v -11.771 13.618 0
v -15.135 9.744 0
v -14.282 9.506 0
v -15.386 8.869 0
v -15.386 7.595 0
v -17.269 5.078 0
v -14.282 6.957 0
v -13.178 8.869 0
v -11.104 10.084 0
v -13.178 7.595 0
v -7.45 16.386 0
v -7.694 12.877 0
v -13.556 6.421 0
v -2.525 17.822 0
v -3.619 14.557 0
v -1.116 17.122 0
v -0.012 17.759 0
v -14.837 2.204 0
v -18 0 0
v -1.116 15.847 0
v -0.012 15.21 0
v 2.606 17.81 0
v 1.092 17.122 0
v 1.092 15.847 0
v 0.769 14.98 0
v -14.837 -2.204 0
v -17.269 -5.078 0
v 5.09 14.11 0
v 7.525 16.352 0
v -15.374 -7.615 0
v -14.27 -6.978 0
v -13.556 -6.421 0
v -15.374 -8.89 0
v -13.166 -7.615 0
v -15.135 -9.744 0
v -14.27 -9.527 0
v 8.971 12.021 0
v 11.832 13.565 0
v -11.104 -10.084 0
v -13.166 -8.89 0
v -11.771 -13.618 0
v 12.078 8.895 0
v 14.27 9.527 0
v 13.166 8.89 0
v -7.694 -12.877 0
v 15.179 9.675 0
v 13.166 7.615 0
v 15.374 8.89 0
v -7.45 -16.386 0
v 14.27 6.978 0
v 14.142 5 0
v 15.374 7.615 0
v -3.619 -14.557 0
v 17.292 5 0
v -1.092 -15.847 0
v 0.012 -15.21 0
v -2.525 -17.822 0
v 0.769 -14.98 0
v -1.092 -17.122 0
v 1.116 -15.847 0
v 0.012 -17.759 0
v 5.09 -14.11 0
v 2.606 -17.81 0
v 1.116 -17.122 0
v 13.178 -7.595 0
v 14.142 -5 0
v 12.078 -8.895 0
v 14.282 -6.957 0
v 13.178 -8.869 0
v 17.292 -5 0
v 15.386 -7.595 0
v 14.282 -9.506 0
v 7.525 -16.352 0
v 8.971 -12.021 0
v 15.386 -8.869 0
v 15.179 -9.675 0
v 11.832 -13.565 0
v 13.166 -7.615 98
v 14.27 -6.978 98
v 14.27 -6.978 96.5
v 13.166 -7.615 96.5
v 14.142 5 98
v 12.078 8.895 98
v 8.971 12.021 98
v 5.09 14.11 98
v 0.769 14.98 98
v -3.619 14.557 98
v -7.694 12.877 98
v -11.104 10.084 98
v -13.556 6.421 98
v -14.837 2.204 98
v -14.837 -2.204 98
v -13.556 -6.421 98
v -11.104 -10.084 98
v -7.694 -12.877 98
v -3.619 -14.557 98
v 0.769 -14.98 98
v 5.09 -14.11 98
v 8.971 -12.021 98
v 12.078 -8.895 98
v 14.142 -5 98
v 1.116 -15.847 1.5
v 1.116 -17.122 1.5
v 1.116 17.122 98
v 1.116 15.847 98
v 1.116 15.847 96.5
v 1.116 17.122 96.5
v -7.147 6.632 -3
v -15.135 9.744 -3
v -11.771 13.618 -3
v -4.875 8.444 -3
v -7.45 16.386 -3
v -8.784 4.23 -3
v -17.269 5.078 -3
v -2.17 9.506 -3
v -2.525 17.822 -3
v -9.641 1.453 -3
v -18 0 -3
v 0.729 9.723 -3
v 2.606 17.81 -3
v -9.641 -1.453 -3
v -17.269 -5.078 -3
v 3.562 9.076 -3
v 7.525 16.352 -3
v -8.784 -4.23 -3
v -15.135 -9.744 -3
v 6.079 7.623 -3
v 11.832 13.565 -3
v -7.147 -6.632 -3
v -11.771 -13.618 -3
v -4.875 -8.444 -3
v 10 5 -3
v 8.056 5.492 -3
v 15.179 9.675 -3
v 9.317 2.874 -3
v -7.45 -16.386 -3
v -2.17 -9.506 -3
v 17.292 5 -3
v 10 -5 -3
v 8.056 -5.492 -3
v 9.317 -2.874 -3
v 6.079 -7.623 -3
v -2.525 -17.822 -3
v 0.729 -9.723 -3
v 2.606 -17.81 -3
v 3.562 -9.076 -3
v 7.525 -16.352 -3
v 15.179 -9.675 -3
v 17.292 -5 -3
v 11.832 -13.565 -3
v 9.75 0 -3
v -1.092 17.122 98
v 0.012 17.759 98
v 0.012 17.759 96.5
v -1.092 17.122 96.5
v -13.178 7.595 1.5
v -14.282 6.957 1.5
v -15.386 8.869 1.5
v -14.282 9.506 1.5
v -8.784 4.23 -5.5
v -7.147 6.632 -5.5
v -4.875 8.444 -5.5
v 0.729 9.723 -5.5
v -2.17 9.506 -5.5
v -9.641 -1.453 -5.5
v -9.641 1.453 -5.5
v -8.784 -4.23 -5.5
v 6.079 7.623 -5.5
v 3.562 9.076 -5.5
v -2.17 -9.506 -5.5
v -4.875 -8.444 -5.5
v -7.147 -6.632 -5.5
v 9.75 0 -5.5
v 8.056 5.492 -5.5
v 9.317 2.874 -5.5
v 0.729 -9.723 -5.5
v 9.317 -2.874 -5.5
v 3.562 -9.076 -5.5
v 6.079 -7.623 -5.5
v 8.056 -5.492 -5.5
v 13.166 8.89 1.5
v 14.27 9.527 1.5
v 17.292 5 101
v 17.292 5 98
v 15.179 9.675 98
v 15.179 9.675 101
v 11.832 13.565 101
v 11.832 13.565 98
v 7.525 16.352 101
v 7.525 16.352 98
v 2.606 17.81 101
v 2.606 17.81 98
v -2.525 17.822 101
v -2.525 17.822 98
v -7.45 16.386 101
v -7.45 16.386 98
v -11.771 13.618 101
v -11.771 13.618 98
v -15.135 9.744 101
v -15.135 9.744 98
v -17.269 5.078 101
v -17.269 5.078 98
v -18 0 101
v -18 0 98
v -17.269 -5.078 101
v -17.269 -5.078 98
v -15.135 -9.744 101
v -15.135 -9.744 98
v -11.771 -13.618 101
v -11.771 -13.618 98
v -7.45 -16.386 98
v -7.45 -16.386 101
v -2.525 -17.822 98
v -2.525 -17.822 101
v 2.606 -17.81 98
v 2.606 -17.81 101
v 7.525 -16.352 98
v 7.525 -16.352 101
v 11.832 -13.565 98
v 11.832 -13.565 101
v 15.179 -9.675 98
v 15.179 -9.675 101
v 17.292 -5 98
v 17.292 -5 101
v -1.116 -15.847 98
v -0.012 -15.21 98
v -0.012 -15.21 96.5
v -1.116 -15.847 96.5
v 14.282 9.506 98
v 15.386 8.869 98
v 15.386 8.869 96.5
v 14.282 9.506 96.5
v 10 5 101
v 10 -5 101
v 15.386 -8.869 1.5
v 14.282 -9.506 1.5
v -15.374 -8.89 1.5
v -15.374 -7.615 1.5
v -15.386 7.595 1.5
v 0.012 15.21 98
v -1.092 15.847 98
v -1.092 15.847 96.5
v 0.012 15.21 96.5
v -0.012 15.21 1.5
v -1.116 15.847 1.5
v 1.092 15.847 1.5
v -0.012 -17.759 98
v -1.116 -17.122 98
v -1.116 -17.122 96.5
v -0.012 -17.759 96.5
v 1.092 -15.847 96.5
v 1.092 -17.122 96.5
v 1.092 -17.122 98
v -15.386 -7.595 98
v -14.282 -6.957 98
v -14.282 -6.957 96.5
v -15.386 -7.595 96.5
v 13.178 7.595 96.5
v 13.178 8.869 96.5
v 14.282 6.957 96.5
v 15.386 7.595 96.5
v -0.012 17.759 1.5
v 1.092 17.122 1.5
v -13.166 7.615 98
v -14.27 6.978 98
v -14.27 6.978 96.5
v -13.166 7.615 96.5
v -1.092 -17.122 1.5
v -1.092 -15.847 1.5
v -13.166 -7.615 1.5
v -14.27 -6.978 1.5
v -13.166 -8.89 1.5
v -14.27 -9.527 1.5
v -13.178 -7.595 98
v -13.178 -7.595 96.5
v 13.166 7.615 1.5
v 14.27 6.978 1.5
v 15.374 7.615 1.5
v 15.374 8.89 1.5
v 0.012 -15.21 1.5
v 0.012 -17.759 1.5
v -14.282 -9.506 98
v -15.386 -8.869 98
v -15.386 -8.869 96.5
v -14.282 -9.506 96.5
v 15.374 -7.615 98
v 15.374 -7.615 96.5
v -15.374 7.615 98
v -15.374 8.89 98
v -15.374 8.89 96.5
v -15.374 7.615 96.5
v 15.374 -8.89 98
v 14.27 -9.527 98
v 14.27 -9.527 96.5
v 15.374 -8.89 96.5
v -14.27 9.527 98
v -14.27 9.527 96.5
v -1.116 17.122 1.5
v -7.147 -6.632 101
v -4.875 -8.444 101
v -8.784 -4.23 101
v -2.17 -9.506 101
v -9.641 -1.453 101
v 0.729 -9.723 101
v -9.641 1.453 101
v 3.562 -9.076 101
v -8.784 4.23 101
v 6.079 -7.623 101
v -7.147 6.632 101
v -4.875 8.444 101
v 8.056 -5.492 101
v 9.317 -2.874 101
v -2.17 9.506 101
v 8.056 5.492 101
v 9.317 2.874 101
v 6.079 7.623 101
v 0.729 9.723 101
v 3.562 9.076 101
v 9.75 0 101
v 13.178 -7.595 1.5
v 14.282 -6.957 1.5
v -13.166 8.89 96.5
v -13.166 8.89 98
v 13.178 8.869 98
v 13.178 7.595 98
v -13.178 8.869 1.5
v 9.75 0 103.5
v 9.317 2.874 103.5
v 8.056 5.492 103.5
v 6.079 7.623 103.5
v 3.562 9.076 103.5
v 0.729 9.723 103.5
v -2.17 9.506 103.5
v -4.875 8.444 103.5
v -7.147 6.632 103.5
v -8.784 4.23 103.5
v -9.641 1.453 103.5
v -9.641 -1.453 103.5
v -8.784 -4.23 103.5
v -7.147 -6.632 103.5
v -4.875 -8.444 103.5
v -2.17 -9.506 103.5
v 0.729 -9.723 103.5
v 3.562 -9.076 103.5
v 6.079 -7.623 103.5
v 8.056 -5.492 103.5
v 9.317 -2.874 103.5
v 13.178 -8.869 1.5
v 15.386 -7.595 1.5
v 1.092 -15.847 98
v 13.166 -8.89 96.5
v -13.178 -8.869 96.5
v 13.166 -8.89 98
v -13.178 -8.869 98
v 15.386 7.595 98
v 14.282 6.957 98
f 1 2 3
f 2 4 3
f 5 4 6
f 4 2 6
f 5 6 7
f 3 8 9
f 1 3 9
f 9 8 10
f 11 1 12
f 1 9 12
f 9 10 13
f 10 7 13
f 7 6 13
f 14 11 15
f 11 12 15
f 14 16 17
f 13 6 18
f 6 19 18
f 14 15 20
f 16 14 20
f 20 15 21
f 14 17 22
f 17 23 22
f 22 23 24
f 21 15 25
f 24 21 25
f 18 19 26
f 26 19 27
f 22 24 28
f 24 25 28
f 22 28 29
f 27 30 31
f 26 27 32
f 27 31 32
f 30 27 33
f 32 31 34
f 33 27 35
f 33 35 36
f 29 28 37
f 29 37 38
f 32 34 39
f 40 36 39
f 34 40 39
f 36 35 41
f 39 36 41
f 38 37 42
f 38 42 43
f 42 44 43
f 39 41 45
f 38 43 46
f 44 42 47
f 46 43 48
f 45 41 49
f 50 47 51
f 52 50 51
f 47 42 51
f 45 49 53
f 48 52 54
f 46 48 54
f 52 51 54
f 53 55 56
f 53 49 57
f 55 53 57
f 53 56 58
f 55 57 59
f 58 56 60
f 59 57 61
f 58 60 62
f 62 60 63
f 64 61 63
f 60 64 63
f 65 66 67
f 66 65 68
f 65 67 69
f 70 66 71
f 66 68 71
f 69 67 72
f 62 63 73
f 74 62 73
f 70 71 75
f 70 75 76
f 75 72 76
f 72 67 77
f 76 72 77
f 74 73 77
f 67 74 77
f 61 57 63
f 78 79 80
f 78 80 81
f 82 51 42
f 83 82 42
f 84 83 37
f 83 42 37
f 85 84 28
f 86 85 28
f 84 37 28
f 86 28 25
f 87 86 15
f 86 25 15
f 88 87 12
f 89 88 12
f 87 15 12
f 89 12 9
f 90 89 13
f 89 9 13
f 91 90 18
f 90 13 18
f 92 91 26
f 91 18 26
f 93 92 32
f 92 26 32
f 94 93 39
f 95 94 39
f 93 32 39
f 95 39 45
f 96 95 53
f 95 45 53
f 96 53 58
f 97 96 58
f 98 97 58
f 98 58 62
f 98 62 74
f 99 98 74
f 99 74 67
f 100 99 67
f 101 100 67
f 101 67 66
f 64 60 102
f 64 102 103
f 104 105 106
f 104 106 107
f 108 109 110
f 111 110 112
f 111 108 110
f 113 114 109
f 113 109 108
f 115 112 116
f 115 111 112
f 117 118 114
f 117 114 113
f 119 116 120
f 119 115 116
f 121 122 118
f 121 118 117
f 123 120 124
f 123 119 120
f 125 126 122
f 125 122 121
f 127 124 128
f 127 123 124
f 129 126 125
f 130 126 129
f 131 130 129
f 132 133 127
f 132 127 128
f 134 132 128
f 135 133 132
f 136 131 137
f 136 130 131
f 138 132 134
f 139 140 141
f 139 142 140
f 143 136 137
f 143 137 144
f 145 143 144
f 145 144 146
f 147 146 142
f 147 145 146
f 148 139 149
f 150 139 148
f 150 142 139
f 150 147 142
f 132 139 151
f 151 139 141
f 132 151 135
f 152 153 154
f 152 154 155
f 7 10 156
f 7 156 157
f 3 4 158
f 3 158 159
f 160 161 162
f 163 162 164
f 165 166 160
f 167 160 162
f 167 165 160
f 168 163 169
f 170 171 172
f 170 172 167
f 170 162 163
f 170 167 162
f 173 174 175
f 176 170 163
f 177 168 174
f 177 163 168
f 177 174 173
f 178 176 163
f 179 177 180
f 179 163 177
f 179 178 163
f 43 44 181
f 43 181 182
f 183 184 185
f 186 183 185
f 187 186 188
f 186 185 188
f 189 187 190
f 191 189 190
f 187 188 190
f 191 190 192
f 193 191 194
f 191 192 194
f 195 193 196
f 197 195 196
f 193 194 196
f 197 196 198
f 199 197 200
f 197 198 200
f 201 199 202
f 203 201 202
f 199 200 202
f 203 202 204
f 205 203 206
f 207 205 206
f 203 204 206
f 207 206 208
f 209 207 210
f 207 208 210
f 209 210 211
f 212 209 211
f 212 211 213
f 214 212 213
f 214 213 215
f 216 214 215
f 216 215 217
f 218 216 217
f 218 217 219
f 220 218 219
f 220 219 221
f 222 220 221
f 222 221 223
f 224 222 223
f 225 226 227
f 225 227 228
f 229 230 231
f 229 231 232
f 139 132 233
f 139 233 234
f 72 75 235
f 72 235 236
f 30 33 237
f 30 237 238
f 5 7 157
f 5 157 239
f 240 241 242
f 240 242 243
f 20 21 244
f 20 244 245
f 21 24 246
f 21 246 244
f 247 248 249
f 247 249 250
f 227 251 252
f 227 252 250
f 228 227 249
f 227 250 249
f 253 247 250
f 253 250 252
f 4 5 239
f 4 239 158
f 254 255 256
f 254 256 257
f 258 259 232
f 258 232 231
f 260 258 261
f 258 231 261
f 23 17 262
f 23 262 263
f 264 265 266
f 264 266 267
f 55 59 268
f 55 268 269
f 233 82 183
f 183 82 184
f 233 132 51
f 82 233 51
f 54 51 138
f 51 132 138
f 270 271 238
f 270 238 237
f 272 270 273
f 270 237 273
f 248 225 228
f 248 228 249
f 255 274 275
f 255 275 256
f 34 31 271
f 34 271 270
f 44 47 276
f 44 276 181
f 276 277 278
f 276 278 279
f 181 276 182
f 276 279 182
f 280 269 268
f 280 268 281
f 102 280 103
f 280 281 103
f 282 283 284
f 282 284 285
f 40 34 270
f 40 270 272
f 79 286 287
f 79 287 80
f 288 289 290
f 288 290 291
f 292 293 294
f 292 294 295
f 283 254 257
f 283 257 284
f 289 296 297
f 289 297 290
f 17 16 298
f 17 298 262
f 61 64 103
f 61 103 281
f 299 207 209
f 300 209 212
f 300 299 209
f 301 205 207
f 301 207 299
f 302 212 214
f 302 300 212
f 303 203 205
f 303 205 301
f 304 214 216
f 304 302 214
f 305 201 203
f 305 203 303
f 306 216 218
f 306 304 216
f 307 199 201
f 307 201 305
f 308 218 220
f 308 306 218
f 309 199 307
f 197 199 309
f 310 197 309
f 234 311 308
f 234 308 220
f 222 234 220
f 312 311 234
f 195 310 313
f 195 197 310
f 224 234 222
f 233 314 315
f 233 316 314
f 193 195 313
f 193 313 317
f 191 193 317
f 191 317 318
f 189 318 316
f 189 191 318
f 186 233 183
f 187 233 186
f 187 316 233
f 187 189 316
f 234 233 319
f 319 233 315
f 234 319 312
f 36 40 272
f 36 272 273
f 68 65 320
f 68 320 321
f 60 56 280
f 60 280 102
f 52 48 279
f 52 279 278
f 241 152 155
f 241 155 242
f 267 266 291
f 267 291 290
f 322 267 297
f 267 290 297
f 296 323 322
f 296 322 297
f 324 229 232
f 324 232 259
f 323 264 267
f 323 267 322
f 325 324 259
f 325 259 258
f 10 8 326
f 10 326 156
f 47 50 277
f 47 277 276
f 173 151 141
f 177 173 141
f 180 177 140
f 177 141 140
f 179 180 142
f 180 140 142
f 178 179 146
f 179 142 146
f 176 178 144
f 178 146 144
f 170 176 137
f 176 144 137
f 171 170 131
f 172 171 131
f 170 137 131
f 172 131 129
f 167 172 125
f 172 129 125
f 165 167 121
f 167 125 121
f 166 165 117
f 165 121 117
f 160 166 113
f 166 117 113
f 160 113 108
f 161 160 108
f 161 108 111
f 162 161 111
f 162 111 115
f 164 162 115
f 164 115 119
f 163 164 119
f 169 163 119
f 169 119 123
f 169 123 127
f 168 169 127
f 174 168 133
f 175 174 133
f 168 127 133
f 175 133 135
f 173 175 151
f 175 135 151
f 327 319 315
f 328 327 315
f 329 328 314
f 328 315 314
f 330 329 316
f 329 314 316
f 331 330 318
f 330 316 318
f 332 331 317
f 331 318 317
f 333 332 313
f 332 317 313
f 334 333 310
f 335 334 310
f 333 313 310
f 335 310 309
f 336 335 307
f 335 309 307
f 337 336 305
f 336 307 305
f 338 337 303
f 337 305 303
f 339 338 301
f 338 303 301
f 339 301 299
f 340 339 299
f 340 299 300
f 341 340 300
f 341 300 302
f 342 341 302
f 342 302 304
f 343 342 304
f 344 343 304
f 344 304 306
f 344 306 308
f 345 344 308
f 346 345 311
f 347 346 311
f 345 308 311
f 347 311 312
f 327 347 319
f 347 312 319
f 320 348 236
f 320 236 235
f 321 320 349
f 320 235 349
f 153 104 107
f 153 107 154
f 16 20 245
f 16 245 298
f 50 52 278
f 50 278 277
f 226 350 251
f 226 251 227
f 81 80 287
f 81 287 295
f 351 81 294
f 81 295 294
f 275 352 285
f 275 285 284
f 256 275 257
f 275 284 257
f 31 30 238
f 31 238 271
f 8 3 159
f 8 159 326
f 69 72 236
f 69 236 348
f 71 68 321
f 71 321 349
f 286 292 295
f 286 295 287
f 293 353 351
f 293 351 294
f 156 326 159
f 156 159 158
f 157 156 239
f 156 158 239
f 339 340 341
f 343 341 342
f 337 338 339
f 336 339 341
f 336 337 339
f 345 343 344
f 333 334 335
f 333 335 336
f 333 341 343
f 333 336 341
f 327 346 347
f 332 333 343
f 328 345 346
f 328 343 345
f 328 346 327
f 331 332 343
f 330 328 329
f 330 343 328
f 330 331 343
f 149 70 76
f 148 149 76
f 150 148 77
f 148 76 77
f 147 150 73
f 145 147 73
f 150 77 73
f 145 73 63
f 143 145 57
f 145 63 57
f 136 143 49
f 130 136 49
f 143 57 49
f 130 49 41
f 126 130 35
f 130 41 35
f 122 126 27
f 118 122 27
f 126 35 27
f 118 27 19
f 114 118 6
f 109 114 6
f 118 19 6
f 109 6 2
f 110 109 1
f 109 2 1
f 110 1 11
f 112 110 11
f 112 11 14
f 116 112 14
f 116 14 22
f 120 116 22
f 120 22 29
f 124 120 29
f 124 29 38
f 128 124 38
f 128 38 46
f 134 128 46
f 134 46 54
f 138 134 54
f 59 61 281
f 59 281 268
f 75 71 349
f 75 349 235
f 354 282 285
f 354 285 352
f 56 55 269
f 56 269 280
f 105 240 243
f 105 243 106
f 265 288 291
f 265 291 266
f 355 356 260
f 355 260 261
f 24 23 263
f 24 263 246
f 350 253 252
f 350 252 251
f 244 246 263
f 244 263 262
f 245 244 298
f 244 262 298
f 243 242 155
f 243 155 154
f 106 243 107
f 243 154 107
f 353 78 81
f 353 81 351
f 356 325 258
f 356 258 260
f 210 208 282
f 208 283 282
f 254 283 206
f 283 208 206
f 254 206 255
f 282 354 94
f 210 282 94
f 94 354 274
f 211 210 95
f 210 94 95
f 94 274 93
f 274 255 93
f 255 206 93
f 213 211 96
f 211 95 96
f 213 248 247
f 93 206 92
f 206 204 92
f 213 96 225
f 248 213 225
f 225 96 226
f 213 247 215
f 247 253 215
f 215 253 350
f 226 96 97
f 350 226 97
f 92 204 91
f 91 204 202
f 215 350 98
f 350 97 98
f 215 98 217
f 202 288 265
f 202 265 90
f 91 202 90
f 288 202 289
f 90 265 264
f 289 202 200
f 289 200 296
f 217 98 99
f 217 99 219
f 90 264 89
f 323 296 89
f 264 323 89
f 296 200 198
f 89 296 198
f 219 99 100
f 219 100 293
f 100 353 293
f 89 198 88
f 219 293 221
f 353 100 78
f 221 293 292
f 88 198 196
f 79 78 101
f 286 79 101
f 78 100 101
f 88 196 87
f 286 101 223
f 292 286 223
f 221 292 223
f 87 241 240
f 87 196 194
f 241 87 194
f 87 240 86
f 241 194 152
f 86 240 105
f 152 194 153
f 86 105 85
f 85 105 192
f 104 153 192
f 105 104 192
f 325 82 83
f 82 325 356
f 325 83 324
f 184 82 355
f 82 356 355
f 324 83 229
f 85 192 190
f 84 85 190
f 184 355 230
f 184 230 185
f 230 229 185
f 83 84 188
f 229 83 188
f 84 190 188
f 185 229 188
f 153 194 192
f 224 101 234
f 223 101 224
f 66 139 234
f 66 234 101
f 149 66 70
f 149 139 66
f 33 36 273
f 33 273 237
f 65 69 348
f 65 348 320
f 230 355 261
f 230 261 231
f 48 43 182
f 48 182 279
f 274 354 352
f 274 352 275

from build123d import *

# Parameters (mm, degrees)
SKETCH_R              = 15
PAD_DEPTH             = 98
SKETCH002_R           = 18
PAD002_DEPTH          = 3
SKETCH005_R           = 18
PAD004_DEPTH          = 3
SKETCH004_R           = 9.75
PAD005_DEPTH          = 2.5
SKETCH001_R           = 9.75
PAD006_DEPTH          = 2.5
SKETCH003_W           = 8
SKETCH003_H           = 10
POCKET_DEPTH          = 108
PAD007_DEPTH          = 1.5
PAD008_DEPTH          = 1.5
POLARPATTERN_COUNT    = 6
POLARPATTERN001_COUNT = 6


with BuildPart() as part:
    # Sketch → Pad (new body)
    with BuildSketch(Plane.XY):
        Circle(SKETCH_R)
    extrude(amount=PAD_DEPTH)

    # Sketch002 → Pad002 (join)
    with BuildSketch(Plane(origin=(0, 0, 0), x_dir=(1, 0, 0), z_dir=(0, 0, -1))):
        Circle(SKETCH002_R)
    extrude(amount=PAD002_DEPTH)

    # Sketch005 → Pad004 (join)
    with BuildSketch(Plane.XY.offset(98)):
        Circle(SKETCH005_R)
    extrude(amount=PAD004_DEPTH)

    # Sketch004 (on Face3 of Pad002) → Pad005 (join)
    with BuildSketch(Plane(origin=(0, 0, -3), x_dir=(1, 0, 0), z_dir=(0, 0, -1))):
        Circle(SKETCH004_R)
    extrude(amount=PAD005_DEPTH)

    # Sketch001 (on Face3 of Pad004) → Pad006 (join)
    with BuildSketch(Plane.XY.offset(101)):
        Circle(SKETCH001_R)
    extrude(amount=PAD006_DEPTH)

    # Sketch003 (on Face11 of Pad006) → Pocket (cut)
    with BuildSketch(Plane(origin=(0, 0, -5.5), x_dir=(1, 0, 0), z_dir=(0, 0, -1))):
        with Locations((14, 0)):
            Rectangle(SKETCH003_W, SKETCH003_H)
    extrude(amount=-POCKET_DEPTH, mode=Mode.SUBTRACT)

    # Sketch010 (on Face9 of Pocket) → Pad007 (join)
    with BuildSketch(Plane.XY):
        Polygon((-1.11579, 17.121659), (-0.012041, 17.758909), (1.091708, 17.121659), (1.091708, 15.84716), (-0.012041, 15.209911), (-1.11579, 15.84716), align=None)
    pad007 = extrude(amount=PAD007_DEPTH)

    # Sketch014 (on Face2 of Pad007) → Pad008 (join)
    with BuildSketch(Plane(origin=(0, 0, 98), x_dir=(1, 0, 0), z_dir=(0, 0, -1))):
        Polygon((-1.11579, 17.121659), (-0.012041, 17.758909), (1.091708, 17.121659), (1.091708, 15.84716), (-0.012041, 15.209911), (-1.11579, 15.84716), align=None)
    pad008 = extrude(amount=PAD008_DEPTH)

    # PolarPattern: Pad008 ×6 about axis
    polarpattern_axis = Axis((0, 0, 98), (0, 0, -1))
    for i in range(1, POLARPATTERN_COUNT):
        add(pad008.rotate(polarpattern_axis, i * 360 / POLARPATTERN_COUNT))

    # PolarPattern001: Pad007 ×6 about axis
    polarpattern001_axis = Axis((0, 0, 0), (0, 0, 1))
    for i in range(1, POLARPATTERN001_COUNT):
        add(pad007.rotate(polarpattern001_axis, i * 360 / POLARPATTERN001_COUNT))


solid = part.part
